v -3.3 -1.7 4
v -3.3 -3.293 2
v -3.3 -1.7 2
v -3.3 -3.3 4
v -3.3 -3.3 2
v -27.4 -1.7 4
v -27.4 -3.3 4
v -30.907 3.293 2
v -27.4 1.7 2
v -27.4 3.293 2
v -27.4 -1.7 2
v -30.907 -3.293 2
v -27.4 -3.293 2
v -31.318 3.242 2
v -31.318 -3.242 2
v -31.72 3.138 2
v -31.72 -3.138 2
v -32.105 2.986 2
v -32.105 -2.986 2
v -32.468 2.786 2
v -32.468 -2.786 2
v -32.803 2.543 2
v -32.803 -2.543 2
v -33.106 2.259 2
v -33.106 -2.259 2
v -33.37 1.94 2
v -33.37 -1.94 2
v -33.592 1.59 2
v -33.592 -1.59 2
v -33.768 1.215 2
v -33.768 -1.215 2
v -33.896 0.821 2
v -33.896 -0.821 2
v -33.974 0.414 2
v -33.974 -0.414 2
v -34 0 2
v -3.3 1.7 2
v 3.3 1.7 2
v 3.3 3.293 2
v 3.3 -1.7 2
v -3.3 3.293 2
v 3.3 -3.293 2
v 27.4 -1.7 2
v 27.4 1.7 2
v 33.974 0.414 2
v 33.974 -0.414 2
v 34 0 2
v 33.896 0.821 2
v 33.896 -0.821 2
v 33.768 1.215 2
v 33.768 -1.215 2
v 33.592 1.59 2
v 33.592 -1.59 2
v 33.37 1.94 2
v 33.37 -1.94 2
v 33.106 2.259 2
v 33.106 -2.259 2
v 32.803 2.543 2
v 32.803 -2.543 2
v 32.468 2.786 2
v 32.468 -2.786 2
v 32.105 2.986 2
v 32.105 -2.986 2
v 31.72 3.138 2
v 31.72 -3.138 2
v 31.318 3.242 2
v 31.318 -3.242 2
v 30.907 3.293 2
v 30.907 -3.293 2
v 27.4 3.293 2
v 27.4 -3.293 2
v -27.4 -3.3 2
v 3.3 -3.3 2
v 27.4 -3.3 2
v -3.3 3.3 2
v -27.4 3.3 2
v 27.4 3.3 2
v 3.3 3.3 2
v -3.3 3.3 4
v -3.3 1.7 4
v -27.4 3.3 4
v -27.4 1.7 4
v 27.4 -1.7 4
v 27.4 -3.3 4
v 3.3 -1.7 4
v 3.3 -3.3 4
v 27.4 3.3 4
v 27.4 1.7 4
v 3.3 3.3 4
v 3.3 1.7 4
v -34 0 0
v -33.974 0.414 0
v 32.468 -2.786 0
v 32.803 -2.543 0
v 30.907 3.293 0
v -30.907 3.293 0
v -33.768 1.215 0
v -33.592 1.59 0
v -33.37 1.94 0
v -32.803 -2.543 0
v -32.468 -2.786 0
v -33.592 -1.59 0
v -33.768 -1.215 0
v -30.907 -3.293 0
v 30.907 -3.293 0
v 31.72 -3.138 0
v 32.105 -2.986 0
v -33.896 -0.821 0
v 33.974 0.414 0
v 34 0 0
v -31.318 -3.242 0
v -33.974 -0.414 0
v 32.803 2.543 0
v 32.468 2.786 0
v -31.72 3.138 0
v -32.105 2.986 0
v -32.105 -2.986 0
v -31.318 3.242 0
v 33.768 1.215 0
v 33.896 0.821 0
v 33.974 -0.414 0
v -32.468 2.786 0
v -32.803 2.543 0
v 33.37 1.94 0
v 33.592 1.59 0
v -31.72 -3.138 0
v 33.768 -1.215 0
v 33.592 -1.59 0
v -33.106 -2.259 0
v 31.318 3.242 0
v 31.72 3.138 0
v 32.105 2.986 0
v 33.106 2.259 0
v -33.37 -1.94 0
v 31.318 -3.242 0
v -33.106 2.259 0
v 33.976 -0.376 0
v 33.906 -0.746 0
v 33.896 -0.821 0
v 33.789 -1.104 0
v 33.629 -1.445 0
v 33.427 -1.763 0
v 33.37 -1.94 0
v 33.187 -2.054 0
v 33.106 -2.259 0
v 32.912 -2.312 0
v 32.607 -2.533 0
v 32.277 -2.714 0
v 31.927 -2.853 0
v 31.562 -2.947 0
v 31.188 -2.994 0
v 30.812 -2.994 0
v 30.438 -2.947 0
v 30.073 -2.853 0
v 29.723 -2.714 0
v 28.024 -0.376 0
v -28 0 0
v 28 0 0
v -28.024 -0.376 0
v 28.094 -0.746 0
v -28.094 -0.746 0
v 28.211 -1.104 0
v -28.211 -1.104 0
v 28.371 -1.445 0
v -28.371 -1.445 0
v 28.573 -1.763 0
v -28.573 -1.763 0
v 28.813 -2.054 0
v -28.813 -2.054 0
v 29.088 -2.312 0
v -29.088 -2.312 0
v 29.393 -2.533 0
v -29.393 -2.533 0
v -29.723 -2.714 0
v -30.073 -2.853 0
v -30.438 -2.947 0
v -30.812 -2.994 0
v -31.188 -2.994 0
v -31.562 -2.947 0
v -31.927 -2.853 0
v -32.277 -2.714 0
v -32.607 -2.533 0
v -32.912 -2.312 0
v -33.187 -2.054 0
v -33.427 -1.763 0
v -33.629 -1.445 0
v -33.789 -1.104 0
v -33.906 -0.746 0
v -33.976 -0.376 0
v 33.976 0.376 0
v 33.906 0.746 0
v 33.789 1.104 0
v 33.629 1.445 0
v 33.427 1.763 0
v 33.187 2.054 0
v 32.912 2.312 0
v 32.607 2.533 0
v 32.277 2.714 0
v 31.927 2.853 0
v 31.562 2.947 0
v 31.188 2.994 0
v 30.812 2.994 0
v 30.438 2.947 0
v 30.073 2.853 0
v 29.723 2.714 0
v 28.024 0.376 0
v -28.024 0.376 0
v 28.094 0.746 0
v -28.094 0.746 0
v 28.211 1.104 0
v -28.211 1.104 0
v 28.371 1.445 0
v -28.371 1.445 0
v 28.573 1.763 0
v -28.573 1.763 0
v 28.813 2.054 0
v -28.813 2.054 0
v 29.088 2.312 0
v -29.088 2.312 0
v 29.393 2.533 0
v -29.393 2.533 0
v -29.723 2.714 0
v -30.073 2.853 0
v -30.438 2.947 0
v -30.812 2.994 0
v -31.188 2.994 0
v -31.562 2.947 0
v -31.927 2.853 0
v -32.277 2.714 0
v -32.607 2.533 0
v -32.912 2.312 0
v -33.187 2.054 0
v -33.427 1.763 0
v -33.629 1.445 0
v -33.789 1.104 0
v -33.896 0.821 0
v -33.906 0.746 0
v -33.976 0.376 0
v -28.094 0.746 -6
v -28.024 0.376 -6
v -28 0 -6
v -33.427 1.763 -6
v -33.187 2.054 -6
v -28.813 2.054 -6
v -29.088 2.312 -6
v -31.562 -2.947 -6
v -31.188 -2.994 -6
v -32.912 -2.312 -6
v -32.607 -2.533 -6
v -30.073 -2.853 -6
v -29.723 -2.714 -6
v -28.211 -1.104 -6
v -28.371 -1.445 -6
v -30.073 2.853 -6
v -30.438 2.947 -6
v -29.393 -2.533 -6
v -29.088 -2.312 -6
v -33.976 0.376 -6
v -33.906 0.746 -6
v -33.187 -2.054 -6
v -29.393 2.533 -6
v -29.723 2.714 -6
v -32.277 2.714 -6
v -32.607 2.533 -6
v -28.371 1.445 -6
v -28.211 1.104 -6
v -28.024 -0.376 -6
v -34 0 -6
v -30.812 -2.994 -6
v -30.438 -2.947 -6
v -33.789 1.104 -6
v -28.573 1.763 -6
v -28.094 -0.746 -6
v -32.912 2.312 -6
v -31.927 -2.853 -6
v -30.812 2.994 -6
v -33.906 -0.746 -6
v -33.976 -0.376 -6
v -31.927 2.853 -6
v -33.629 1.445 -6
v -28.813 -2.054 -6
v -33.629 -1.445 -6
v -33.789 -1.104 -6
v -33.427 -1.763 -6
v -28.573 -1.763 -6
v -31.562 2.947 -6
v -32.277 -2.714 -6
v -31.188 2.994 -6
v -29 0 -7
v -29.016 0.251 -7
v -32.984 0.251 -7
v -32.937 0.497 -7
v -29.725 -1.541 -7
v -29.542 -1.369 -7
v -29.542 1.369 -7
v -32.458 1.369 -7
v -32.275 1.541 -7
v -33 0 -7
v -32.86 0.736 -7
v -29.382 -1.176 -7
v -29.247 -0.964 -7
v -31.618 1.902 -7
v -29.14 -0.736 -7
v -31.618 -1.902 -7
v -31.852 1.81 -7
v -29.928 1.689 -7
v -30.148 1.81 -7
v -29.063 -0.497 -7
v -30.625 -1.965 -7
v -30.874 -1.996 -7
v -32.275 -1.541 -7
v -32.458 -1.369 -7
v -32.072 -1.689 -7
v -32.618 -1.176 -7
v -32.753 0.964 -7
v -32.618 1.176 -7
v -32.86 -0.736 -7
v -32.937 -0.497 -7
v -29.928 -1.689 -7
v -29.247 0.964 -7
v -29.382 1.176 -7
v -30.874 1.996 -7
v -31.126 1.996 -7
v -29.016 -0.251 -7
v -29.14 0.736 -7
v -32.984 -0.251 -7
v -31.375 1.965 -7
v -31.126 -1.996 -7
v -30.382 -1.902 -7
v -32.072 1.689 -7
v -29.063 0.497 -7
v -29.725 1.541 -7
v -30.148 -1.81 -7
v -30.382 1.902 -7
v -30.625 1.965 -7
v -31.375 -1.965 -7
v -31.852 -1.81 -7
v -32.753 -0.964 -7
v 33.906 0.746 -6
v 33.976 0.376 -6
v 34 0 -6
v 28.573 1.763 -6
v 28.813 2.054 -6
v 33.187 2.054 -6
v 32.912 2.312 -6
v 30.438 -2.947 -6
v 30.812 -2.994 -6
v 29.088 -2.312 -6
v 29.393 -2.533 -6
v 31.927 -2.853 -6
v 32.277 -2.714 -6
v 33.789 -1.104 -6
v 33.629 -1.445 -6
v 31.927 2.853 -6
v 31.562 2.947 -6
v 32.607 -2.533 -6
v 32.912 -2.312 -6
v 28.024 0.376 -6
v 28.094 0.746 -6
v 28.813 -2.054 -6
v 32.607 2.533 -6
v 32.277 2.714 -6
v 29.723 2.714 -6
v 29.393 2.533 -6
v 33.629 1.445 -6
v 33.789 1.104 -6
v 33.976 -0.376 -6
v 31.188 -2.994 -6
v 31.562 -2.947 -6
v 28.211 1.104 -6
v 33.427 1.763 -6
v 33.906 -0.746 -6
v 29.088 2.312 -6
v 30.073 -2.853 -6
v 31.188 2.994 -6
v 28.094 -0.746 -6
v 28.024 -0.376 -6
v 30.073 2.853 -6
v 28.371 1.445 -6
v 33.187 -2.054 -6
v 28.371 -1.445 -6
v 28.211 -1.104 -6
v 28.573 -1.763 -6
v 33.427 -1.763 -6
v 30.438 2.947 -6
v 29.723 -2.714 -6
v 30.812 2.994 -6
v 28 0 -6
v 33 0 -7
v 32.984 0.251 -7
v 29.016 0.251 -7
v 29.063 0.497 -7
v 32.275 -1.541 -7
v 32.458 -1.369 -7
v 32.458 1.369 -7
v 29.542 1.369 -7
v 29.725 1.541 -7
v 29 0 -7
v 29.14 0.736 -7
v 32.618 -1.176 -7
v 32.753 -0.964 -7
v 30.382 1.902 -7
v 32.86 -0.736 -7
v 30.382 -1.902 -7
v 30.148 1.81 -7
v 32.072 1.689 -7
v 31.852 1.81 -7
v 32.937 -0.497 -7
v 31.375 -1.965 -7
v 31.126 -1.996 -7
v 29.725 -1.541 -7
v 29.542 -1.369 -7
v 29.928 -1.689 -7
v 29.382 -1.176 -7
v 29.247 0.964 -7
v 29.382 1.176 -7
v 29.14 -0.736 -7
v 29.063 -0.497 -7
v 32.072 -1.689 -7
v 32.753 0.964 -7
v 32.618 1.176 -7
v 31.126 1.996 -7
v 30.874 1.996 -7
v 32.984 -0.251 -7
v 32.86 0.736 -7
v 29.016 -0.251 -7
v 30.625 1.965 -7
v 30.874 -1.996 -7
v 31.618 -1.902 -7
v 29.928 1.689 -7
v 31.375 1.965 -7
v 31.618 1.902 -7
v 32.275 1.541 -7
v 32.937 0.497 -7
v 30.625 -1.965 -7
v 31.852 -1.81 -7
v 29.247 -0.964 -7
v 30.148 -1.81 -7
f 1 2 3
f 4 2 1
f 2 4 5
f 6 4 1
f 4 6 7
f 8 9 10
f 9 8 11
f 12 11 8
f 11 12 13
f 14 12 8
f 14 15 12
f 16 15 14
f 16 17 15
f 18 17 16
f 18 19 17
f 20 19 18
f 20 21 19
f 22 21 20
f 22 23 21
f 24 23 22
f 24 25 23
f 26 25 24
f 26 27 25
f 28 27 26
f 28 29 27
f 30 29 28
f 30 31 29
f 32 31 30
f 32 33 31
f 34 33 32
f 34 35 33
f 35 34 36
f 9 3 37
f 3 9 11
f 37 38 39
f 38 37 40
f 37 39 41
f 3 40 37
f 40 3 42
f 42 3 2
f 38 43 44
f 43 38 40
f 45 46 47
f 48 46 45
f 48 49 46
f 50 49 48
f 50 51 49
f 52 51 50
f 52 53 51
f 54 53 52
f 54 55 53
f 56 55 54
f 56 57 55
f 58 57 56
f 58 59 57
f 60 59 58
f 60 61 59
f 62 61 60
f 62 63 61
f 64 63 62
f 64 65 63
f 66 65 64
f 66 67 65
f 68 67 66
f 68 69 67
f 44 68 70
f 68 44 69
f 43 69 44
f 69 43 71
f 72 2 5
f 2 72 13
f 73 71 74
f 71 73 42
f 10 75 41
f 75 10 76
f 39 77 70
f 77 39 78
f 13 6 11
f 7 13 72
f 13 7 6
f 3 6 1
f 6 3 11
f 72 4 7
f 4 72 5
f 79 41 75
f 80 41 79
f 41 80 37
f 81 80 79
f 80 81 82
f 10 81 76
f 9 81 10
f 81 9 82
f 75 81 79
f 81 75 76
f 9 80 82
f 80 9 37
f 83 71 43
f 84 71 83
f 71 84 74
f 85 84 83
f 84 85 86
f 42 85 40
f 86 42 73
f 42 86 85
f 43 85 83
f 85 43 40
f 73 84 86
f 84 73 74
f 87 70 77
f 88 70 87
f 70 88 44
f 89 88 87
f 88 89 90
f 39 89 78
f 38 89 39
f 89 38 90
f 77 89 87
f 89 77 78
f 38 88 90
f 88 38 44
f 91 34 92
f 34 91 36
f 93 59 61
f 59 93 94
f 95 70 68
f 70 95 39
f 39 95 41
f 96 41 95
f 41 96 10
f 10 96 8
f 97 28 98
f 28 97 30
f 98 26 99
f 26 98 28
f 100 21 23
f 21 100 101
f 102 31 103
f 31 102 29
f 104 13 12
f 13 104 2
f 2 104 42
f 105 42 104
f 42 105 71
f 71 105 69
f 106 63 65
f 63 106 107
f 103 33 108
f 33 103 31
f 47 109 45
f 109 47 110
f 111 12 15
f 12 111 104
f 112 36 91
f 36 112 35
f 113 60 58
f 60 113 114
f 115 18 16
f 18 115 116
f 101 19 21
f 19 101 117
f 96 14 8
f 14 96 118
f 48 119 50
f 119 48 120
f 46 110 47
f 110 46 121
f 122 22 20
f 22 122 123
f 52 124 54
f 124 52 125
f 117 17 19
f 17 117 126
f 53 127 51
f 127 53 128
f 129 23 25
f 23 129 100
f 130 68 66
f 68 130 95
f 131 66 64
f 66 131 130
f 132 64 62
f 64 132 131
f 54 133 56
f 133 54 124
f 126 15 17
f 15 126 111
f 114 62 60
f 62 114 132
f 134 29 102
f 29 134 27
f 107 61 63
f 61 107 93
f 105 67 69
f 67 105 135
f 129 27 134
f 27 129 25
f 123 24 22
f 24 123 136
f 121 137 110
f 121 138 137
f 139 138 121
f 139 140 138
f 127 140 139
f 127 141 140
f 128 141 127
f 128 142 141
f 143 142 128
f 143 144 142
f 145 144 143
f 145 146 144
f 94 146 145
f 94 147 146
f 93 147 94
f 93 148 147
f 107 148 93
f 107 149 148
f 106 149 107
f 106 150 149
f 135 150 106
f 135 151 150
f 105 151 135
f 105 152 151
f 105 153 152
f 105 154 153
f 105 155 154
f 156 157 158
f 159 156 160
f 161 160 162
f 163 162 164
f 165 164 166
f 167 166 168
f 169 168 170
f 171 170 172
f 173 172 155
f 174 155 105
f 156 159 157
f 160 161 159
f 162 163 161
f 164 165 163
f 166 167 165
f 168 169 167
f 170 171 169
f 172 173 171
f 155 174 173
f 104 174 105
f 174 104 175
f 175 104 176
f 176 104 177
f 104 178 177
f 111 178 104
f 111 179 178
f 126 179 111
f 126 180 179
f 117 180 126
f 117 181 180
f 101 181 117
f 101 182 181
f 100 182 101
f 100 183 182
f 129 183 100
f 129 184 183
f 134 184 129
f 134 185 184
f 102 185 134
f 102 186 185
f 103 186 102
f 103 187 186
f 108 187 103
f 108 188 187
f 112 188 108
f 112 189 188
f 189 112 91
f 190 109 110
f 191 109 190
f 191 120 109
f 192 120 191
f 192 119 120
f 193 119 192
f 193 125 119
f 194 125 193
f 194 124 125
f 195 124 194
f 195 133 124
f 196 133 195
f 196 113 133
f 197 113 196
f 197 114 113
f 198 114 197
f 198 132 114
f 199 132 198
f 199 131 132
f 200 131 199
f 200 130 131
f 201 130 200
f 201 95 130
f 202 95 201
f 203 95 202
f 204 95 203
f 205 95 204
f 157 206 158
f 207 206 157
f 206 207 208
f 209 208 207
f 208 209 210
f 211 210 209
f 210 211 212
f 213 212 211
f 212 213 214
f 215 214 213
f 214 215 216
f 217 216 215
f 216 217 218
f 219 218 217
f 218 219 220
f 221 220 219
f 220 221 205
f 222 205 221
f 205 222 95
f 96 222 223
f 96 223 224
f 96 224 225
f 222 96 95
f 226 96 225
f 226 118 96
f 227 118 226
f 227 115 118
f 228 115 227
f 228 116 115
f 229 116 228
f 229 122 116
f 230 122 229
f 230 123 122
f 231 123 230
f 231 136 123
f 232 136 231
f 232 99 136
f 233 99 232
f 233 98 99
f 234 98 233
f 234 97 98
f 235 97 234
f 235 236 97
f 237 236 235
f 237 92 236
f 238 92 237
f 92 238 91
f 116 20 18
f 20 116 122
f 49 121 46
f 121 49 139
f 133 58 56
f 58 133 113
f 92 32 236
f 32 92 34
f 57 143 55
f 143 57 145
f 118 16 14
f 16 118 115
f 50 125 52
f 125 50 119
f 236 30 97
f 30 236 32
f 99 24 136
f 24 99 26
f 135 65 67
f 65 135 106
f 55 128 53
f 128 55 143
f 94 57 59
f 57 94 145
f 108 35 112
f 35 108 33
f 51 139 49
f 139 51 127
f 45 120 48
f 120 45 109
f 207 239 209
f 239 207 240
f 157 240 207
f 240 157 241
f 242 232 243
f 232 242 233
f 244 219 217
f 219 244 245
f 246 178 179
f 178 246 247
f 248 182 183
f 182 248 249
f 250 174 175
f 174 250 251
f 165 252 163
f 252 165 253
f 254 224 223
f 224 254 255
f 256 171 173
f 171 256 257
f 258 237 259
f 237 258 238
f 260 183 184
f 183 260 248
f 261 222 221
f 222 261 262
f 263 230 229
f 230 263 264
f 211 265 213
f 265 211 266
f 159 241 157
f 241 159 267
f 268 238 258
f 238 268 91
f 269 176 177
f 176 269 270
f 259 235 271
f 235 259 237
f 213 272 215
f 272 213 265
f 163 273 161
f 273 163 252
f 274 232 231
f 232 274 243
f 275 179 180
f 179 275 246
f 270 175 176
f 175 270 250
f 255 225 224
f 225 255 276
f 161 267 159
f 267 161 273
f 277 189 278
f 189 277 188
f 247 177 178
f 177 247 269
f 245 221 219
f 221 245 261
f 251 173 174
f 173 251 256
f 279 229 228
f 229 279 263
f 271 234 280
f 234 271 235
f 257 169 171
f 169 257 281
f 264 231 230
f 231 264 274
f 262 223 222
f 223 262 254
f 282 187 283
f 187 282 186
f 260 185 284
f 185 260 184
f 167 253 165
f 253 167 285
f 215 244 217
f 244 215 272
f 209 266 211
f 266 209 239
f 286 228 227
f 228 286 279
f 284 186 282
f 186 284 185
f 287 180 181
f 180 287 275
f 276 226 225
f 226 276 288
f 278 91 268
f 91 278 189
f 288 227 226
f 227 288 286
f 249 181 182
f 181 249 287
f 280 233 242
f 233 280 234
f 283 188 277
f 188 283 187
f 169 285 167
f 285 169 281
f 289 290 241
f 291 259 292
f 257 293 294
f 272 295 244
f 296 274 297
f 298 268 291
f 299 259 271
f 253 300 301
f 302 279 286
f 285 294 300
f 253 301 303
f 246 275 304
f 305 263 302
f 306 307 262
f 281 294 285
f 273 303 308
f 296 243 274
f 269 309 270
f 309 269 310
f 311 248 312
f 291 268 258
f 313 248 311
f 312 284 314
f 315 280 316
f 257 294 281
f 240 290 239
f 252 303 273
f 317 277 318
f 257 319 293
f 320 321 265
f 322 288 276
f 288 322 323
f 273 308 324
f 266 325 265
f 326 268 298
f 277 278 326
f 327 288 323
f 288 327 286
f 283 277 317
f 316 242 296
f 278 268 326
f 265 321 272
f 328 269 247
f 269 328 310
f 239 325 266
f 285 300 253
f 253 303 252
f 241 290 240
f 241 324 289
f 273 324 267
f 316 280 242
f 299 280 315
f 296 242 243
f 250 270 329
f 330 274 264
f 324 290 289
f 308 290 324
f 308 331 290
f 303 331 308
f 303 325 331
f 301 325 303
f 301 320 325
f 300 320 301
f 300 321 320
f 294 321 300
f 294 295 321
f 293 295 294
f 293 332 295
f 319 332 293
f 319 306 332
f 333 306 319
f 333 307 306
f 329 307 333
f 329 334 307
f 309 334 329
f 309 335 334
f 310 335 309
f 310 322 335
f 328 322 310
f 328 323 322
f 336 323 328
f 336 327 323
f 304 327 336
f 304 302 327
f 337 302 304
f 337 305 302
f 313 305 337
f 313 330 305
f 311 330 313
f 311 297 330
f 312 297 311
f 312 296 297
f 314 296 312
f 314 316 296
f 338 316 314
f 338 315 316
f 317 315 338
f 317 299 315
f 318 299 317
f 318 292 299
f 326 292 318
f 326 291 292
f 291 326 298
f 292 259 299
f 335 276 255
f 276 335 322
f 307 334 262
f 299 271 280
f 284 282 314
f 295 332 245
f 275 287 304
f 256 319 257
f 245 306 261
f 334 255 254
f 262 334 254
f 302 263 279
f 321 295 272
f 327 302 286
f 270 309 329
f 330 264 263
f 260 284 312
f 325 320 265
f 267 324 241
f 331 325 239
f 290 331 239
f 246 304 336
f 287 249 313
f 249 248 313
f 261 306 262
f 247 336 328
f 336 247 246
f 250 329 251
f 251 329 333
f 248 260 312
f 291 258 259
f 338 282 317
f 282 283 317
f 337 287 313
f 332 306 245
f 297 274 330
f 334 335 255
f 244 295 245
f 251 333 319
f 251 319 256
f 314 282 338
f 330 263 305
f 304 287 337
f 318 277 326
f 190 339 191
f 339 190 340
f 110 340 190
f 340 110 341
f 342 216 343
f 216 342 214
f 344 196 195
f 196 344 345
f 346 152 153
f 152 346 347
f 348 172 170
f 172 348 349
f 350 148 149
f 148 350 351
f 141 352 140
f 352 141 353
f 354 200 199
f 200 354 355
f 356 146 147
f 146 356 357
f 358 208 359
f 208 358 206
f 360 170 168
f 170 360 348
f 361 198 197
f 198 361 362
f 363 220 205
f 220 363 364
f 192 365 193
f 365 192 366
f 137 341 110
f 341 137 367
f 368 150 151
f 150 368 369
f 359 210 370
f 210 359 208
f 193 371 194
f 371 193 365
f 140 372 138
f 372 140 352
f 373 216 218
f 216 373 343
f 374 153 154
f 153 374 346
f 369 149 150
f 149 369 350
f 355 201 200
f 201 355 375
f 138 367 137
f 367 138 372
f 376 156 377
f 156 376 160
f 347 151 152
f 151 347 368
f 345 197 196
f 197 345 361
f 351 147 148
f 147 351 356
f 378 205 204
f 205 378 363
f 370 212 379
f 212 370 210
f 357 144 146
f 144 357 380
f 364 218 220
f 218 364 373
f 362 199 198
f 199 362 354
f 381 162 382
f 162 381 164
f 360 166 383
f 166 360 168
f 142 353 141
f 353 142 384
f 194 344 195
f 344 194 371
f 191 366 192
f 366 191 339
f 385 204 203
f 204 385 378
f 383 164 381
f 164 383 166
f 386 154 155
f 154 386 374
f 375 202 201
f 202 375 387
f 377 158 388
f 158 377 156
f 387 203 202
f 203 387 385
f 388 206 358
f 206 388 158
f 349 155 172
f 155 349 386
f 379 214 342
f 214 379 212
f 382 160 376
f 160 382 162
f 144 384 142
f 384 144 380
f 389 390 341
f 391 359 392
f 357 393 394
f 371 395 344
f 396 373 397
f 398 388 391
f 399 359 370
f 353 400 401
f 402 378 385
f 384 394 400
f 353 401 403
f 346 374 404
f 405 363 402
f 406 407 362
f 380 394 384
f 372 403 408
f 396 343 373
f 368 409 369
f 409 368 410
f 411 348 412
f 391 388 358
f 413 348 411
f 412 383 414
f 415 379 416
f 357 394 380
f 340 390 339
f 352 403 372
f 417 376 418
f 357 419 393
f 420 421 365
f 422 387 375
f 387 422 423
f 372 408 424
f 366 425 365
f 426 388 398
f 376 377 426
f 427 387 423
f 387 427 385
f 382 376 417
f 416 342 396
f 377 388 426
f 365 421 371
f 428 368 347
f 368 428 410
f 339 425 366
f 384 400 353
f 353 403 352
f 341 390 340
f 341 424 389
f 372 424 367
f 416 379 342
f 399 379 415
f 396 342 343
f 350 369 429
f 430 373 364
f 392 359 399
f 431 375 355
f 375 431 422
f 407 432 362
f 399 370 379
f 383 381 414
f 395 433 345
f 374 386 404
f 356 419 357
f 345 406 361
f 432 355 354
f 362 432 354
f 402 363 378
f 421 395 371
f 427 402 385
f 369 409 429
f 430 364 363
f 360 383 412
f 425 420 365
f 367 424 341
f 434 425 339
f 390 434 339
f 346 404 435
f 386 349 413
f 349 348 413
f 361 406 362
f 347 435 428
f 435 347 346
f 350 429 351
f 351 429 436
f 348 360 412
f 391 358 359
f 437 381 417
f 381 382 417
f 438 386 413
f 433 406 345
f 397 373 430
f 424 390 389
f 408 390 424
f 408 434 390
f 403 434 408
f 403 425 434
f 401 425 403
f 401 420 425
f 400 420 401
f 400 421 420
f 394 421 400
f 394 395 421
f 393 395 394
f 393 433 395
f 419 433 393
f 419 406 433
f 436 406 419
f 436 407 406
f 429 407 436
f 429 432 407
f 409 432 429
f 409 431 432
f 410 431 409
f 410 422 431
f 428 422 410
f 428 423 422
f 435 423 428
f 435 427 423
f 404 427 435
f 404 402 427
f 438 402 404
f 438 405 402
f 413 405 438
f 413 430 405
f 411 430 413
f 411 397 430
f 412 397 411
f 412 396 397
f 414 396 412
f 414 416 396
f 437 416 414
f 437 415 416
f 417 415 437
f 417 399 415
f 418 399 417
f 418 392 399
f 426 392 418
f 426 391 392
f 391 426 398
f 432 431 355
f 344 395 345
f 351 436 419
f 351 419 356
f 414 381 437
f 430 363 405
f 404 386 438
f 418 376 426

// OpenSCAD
$fn=50;

baseLngth=62+6;
baseHght=2;
matThck=3;
spcng=0.2;
drill=3;
minWallThck=1.6; //lineWdth=0.4
fudge=0.1;
baseWdth=matThck+spcng*2+minWallThck*2;
guideLngth=baseLngth/2-baseWdth*1.5;
guideHght=2;

/* [dowels] */
dwlDia=6;
dwlLngth=7;
dwlDist=62;

windowRail(false,true);
*translate([0,0,0.2]) uniScrew();

module windowRail(drills=true,dowels=false){
  //base
  translate([0,0,baseHght/2]){
    difference(){
      hull() for (ix=[-1,1]) translate([ix*(baseLngth-baseWdth)/2,0,0]) 
        cylinder(d=baseWdth,h=baseHght,center=true);
      if (drills) for (ix=[-1,0,1]) translate([ix*(baseLngth-baseWdth)/2,0]){
        cylinder(d=drill+fudge,h=baseHght+fudge,center=true);
        translate([0,0,-baseHght/2+0.2]) cylinder(d1=drill+fudge,d2=6+fudge*2,h=1.8+fudge);
      }
    }
    //guide
    for (ix=[-1,1],iy=[-1,1]) 
      translate([ix*(baseLngth-baseWdth)/4,iy*(baseWdth-minWallThck)/2,(baseHght+guideHght)/2])
        cube([guideLngth,minWallThck,guideHght],true);
  }
  //dowels
  if (dowels) for (ix=[-1,1])
    translate([ix*(dwlDist)/2,0,0]){
      translate([0,0,-dwlLngth+1]) cylinder(d=dwlDia,h=dwlLngth-1);
      translate([0,0,-dwlLngth]) cylinder(d1=dwlDia-2,d2=dwlDia,h=1);
    }
}


module uniScrew(d=3,l=20,head="star"){
  dk=6;
  k=1.8;
  cylinder(d1=d,d2=dk,h=k);
  translate([0,0,-l]) cylinder(d=d,h=l);
}
